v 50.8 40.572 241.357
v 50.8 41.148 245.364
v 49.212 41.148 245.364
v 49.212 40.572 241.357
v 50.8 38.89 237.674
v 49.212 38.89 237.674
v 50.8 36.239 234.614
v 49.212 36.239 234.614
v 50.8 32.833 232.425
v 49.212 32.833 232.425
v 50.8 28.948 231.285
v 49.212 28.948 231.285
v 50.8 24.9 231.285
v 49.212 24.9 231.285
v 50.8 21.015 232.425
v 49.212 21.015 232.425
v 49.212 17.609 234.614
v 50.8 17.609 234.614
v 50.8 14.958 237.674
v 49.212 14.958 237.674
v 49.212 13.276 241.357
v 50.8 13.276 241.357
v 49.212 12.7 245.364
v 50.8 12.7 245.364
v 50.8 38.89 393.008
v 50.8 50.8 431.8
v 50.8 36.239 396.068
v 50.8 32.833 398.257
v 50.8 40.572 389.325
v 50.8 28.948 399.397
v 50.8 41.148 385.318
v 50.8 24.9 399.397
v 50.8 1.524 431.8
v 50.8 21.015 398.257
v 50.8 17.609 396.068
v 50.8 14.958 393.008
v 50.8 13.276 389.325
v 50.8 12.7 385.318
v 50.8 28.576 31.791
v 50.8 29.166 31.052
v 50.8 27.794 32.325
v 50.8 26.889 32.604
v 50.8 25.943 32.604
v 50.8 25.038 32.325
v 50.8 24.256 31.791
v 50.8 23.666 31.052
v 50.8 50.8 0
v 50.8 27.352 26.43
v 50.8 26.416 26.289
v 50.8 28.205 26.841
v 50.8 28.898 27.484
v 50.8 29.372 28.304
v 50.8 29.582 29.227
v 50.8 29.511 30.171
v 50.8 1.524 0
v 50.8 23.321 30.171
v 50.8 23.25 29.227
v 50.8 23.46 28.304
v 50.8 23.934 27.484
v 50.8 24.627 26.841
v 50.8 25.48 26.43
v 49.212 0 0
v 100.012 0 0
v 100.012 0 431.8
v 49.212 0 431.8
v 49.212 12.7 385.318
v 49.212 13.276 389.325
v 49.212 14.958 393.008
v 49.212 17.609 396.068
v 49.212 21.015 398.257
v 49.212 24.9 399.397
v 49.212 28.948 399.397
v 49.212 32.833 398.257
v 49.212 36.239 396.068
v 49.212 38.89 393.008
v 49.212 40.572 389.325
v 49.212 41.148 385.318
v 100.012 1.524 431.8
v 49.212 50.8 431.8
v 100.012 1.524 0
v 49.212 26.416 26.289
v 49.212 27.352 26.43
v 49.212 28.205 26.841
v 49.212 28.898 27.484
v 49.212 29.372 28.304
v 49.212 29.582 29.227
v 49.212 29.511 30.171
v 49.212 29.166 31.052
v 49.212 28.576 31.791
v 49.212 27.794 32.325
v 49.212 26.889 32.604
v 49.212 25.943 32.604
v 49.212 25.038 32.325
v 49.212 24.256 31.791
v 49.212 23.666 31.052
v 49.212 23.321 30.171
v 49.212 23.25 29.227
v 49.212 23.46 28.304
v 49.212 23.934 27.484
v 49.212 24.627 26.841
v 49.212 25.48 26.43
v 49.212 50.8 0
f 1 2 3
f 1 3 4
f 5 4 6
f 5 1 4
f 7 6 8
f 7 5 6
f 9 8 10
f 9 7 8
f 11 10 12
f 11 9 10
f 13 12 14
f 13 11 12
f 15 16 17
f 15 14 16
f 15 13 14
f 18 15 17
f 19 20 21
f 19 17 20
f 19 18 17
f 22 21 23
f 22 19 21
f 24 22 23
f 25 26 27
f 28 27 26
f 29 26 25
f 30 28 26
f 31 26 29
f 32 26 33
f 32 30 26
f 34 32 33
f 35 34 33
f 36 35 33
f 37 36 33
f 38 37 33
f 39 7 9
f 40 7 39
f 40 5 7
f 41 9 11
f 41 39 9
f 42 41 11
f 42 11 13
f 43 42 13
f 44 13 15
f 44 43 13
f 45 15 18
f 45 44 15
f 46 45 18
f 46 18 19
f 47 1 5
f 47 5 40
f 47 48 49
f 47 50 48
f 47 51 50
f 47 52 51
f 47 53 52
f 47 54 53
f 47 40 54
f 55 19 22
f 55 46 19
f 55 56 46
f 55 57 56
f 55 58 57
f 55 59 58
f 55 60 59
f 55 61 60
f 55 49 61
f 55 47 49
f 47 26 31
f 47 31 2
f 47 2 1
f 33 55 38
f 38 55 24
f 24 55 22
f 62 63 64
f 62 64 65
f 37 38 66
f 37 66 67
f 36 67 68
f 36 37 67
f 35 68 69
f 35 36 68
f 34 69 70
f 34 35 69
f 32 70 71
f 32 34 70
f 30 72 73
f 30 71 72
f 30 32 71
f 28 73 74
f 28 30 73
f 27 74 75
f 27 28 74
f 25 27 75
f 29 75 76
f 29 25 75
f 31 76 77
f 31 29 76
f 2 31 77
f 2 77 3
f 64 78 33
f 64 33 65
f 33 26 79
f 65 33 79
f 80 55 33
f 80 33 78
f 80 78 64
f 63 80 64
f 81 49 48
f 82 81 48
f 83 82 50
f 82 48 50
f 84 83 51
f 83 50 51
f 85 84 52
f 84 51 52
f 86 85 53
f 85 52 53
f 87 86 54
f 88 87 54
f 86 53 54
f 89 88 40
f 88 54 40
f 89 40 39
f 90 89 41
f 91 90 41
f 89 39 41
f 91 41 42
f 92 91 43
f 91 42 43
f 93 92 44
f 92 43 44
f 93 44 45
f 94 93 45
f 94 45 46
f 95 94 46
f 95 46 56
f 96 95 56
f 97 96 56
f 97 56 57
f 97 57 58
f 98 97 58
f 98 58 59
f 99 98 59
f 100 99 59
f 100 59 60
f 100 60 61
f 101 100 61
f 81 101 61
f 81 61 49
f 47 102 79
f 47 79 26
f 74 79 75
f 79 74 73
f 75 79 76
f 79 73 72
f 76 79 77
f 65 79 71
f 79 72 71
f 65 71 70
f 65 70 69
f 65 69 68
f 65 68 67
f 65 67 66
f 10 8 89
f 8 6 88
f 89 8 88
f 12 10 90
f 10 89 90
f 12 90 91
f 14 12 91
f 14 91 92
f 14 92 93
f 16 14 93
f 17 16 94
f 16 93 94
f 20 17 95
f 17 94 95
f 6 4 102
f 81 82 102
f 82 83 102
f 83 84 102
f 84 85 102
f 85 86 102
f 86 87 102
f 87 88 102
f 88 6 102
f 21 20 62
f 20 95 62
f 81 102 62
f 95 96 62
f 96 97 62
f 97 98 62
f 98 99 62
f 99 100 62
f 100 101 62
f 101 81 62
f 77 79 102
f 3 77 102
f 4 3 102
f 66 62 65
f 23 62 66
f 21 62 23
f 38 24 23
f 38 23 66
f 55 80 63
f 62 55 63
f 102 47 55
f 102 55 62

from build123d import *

# Parameters (mm, degrees)
BOSS_EXTRUDE2_DEPTH = 431.8
SKETCH8_R           = 3.175
CUT_EXTRUDE6_DEPTH  = 2.54


with BuildPart() as part:
    # Sketch3 → Boss-Extrude2 (new body)
    with BuildSketch(Plane.XY):
        Polygon((49.2125, 1.5875), (49.2125, 50.8), (50.8, 50.8), (50.8, 1.524), (100.0125, 1.524), (100.0125, 0), (49.2125, 0), align=None)
    extrude(amount=BOSS_EXTRUDE2_DEPTH)

    # Sketch8 → Cut-Extrude6 (cut)
    with BuildSketch(Plane(origin=(50.8, 0, 0), x_dir=(0, 0, -1), z_dir=(1, 0, 0))):
        with Locations((-29.464, 26.416)):
            Circle(SKETCH8_R)
        with BuildLine():
            Line((-245.364, 12.7), (-385.318, 12.7))
            ThreePointArc((-385.318, 12.7), (-399.542, 26.924), (-385.318, 41.148))
            Line((-385.318, 41.148), (-245.364, 41.148))
            ThreePointArc((-245.364, 41.148), (-231.14, 26.924), (-245.364, 12.7))
        make_face()
    extrude(amount=-CUT_EXTRUDE6_DEPTH, mode=Mode.SUBTRACT)


solid = part.part
